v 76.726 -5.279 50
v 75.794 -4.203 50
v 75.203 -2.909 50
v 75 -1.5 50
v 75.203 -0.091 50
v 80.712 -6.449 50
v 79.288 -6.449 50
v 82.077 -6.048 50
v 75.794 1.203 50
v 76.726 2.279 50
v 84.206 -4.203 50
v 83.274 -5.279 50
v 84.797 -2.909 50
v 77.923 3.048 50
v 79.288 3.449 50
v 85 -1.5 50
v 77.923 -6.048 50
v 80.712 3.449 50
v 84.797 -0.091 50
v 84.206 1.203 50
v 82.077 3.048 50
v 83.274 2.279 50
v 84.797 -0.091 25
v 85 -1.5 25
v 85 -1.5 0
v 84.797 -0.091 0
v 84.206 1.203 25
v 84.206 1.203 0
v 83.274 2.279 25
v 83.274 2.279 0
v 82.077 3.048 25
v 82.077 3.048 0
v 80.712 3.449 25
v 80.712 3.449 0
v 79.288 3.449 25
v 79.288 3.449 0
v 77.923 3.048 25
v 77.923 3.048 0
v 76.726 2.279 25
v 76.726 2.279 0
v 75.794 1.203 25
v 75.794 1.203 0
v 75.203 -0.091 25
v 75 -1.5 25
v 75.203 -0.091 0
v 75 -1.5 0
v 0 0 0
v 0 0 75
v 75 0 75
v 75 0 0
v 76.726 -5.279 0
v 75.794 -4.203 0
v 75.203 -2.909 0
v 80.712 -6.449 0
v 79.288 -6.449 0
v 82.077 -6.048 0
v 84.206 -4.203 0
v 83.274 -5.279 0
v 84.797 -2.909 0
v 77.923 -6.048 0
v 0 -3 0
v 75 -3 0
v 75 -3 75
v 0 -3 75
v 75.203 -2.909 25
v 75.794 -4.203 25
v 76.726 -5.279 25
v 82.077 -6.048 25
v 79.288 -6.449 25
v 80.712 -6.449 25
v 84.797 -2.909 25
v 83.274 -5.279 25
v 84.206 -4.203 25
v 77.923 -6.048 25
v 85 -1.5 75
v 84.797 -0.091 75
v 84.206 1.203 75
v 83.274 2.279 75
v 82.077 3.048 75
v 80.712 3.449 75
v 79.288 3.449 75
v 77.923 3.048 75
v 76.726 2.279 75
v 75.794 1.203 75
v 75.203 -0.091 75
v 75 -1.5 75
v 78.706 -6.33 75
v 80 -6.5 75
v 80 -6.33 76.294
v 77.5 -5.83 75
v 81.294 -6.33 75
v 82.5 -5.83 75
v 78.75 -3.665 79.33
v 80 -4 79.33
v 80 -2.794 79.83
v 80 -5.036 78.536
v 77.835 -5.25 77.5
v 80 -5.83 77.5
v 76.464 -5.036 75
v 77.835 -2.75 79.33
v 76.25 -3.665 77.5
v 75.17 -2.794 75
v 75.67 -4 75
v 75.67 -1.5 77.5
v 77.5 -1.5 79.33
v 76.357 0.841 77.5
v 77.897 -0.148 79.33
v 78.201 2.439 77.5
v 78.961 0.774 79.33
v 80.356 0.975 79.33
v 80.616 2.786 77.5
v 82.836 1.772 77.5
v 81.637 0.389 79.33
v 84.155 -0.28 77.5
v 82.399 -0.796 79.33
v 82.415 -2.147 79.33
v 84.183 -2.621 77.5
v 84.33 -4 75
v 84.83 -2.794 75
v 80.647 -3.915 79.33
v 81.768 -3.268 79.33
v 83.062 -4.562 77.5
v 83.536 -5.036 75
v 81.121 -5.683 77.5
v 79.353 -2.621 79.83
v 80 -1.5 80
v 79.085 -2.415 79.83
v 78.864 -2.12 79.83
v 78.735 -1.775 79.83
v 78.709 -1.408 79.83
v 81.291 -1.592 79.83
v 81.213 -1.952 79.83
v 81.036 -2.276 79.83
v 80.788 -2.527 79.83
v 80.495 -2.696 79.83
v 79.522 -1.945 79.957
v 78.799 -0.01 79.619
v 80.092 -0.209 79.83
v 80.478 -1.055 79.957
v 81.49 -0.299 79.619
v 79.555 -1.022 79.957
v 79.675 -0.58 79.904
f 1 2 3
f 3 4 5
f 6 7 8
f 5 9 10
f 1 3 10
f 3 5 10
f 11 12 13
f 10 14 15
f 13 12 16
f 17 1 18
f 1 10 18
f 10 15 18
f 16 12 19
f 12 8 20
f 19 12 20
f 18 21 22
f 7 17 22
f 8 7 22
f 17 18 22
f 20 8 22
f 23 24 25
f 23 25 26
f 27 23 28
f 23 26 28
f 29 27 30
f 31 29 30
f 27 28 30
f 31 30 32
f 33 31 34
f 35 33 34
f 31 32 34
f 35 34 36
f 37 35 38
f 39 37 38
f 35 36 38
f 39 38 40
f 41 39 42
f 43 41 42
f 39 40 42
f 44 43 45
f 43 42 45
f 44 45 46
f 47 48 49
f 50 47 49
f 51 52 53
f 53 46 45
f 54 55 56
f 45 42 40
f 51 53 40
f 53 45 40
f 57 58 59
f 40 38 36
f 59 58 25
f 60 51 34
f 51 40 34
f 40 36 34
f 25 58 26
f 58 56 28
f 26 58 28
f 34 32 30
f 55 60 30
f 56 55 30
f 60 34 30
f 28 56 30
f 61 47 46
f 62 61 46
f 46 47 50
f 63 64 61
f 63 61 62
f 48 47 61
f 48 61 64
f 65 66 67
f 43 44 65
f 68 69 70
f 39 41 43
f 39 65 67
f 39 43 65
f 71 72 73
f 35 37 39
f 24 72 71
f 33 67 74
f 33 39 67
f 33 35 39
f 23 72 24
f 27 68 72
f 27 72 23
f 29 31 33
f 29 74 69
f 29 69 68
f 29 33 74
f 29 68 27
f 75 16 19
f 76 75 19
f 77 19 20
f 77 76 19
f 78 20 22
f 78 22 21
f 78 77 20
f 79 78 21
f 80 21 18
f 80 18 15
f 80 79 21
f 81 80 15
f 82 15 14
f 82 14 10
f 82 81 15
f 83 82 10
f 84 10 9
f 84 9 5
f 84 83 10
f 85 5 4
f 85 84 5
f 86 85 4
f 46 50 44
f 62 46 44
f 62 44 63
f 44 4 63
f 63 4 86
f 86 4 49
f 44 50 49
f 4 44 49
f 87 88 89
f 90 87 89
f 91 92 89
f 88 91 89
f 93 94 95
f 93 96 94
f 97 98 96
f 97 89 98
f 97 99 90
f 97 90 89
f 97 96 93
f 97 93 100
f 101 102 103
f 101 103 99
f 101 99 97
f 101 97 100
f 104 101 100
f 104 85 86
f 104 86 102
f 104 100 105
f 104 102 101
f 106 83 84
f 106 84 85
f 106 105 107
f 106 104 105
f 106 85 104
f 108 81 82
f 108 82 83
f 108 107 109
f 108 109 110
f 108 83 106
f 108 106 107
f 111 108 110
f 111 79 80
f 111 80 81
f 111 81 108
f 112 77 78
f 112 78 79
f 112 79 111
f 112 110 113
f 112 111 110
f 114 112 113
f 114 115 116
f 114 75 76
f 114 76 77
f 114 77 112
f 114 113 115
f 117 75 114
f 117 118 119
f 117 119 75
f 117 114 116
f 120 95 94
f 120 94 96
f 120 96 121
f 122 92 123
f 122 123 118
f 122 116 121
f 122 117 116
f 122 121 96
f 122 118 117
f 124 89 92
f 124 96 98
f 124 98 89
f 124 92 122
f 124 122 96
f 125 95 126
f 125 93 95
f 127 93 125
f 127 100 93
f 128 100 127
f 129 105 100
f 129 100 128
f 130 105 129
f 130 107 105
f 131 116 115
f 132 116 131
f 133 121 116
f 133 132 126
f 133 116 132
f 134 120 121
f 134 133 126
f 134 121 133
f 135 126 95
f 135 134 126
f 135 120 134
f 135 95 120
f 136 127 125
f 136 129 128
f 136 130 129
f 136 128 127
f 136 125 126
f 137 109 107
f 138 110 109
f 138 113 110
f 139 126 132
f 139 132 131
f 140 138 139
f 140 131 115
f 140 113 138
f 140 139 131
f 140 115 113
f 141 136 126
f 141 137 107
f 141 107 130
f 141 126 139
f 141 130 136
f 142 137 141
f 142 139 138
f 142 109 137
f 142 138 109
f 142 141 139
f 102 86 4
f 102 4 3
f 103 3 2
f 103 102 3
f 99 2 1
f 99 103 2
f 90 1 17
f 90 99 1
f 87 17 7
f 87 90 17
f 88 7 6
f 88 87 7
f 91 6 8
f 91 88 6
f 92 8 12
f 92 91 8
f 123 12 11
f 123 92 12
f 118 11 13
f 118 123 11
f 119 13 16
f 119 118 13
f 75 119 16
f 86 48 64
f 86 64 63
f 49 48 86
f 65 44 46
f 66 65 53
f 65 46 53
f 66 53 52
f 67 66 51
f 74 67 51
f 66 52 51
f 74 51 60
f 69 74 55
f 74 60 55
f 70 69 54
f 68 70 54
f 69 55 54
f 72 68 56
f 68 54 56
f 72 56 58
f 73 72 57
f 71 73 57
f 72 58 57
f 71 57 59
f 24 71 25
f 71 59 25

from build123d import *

# Parameters (mm, degrees)
F0_W     = 75
F0_H     = 75
F1_DEPTH = 3
F3_DEPTH = 25
F5_DEPTH = 25


with BuildPart() as f1:
    # F0 (on Front) → F1 (new body)
    with BuildSketch(Plane.XZ):
        with Locations((37.5, 37.5)):
            Rectangle(F0_W, F0_H)
    extrude(amount=F1_DEPTH)

    # F2 (on Top) → F3 (join)
    with BuildSketch(Plane.XY):
        with BuildLine():
            ThreePointArc((75, -1.5), (80, -6.5), (85, -1.5))
            ThreePointArc((85, -1.5), (80, 3.5), (75, -1.5))
        make_face()
    extrude(amount=F3_DEPTH)



with BuildPart() as f5:
    # F4 (on face) → F5 (new body)
    with BuildSketch(Plane.XY.offset(75)):
        with BuildLine():
            ThreePointArc((75, -1.5), (80, -6.5), (85, -1.5))
            ThreePointArc((85, -1.5), (80, 3.5), (75, -1.5))
        make_face()
    extrude(amount=-F5_DEPTH)


with BuildPart() as f1_1:
    add(f1.part)

    add(f5.part)  # F8 merges F5
    # F7 (on offset) → F8 (revolve)
    with BuildSketch(Plane.YZ.offset(80)):
        with BuildLine():
            ThreePointArc((-1.5, 80), (-5.035534, 78.535534), (-6.5, 75))
            Line((-6.5, 75), (-1.5, 75))
            Line((-1.5, 75), (-1.5, 80))
        make_face()
    revolve(axis=Axis((80, -1.5, 77.5), (0, 0, -1)))


solid = f1_1.part
